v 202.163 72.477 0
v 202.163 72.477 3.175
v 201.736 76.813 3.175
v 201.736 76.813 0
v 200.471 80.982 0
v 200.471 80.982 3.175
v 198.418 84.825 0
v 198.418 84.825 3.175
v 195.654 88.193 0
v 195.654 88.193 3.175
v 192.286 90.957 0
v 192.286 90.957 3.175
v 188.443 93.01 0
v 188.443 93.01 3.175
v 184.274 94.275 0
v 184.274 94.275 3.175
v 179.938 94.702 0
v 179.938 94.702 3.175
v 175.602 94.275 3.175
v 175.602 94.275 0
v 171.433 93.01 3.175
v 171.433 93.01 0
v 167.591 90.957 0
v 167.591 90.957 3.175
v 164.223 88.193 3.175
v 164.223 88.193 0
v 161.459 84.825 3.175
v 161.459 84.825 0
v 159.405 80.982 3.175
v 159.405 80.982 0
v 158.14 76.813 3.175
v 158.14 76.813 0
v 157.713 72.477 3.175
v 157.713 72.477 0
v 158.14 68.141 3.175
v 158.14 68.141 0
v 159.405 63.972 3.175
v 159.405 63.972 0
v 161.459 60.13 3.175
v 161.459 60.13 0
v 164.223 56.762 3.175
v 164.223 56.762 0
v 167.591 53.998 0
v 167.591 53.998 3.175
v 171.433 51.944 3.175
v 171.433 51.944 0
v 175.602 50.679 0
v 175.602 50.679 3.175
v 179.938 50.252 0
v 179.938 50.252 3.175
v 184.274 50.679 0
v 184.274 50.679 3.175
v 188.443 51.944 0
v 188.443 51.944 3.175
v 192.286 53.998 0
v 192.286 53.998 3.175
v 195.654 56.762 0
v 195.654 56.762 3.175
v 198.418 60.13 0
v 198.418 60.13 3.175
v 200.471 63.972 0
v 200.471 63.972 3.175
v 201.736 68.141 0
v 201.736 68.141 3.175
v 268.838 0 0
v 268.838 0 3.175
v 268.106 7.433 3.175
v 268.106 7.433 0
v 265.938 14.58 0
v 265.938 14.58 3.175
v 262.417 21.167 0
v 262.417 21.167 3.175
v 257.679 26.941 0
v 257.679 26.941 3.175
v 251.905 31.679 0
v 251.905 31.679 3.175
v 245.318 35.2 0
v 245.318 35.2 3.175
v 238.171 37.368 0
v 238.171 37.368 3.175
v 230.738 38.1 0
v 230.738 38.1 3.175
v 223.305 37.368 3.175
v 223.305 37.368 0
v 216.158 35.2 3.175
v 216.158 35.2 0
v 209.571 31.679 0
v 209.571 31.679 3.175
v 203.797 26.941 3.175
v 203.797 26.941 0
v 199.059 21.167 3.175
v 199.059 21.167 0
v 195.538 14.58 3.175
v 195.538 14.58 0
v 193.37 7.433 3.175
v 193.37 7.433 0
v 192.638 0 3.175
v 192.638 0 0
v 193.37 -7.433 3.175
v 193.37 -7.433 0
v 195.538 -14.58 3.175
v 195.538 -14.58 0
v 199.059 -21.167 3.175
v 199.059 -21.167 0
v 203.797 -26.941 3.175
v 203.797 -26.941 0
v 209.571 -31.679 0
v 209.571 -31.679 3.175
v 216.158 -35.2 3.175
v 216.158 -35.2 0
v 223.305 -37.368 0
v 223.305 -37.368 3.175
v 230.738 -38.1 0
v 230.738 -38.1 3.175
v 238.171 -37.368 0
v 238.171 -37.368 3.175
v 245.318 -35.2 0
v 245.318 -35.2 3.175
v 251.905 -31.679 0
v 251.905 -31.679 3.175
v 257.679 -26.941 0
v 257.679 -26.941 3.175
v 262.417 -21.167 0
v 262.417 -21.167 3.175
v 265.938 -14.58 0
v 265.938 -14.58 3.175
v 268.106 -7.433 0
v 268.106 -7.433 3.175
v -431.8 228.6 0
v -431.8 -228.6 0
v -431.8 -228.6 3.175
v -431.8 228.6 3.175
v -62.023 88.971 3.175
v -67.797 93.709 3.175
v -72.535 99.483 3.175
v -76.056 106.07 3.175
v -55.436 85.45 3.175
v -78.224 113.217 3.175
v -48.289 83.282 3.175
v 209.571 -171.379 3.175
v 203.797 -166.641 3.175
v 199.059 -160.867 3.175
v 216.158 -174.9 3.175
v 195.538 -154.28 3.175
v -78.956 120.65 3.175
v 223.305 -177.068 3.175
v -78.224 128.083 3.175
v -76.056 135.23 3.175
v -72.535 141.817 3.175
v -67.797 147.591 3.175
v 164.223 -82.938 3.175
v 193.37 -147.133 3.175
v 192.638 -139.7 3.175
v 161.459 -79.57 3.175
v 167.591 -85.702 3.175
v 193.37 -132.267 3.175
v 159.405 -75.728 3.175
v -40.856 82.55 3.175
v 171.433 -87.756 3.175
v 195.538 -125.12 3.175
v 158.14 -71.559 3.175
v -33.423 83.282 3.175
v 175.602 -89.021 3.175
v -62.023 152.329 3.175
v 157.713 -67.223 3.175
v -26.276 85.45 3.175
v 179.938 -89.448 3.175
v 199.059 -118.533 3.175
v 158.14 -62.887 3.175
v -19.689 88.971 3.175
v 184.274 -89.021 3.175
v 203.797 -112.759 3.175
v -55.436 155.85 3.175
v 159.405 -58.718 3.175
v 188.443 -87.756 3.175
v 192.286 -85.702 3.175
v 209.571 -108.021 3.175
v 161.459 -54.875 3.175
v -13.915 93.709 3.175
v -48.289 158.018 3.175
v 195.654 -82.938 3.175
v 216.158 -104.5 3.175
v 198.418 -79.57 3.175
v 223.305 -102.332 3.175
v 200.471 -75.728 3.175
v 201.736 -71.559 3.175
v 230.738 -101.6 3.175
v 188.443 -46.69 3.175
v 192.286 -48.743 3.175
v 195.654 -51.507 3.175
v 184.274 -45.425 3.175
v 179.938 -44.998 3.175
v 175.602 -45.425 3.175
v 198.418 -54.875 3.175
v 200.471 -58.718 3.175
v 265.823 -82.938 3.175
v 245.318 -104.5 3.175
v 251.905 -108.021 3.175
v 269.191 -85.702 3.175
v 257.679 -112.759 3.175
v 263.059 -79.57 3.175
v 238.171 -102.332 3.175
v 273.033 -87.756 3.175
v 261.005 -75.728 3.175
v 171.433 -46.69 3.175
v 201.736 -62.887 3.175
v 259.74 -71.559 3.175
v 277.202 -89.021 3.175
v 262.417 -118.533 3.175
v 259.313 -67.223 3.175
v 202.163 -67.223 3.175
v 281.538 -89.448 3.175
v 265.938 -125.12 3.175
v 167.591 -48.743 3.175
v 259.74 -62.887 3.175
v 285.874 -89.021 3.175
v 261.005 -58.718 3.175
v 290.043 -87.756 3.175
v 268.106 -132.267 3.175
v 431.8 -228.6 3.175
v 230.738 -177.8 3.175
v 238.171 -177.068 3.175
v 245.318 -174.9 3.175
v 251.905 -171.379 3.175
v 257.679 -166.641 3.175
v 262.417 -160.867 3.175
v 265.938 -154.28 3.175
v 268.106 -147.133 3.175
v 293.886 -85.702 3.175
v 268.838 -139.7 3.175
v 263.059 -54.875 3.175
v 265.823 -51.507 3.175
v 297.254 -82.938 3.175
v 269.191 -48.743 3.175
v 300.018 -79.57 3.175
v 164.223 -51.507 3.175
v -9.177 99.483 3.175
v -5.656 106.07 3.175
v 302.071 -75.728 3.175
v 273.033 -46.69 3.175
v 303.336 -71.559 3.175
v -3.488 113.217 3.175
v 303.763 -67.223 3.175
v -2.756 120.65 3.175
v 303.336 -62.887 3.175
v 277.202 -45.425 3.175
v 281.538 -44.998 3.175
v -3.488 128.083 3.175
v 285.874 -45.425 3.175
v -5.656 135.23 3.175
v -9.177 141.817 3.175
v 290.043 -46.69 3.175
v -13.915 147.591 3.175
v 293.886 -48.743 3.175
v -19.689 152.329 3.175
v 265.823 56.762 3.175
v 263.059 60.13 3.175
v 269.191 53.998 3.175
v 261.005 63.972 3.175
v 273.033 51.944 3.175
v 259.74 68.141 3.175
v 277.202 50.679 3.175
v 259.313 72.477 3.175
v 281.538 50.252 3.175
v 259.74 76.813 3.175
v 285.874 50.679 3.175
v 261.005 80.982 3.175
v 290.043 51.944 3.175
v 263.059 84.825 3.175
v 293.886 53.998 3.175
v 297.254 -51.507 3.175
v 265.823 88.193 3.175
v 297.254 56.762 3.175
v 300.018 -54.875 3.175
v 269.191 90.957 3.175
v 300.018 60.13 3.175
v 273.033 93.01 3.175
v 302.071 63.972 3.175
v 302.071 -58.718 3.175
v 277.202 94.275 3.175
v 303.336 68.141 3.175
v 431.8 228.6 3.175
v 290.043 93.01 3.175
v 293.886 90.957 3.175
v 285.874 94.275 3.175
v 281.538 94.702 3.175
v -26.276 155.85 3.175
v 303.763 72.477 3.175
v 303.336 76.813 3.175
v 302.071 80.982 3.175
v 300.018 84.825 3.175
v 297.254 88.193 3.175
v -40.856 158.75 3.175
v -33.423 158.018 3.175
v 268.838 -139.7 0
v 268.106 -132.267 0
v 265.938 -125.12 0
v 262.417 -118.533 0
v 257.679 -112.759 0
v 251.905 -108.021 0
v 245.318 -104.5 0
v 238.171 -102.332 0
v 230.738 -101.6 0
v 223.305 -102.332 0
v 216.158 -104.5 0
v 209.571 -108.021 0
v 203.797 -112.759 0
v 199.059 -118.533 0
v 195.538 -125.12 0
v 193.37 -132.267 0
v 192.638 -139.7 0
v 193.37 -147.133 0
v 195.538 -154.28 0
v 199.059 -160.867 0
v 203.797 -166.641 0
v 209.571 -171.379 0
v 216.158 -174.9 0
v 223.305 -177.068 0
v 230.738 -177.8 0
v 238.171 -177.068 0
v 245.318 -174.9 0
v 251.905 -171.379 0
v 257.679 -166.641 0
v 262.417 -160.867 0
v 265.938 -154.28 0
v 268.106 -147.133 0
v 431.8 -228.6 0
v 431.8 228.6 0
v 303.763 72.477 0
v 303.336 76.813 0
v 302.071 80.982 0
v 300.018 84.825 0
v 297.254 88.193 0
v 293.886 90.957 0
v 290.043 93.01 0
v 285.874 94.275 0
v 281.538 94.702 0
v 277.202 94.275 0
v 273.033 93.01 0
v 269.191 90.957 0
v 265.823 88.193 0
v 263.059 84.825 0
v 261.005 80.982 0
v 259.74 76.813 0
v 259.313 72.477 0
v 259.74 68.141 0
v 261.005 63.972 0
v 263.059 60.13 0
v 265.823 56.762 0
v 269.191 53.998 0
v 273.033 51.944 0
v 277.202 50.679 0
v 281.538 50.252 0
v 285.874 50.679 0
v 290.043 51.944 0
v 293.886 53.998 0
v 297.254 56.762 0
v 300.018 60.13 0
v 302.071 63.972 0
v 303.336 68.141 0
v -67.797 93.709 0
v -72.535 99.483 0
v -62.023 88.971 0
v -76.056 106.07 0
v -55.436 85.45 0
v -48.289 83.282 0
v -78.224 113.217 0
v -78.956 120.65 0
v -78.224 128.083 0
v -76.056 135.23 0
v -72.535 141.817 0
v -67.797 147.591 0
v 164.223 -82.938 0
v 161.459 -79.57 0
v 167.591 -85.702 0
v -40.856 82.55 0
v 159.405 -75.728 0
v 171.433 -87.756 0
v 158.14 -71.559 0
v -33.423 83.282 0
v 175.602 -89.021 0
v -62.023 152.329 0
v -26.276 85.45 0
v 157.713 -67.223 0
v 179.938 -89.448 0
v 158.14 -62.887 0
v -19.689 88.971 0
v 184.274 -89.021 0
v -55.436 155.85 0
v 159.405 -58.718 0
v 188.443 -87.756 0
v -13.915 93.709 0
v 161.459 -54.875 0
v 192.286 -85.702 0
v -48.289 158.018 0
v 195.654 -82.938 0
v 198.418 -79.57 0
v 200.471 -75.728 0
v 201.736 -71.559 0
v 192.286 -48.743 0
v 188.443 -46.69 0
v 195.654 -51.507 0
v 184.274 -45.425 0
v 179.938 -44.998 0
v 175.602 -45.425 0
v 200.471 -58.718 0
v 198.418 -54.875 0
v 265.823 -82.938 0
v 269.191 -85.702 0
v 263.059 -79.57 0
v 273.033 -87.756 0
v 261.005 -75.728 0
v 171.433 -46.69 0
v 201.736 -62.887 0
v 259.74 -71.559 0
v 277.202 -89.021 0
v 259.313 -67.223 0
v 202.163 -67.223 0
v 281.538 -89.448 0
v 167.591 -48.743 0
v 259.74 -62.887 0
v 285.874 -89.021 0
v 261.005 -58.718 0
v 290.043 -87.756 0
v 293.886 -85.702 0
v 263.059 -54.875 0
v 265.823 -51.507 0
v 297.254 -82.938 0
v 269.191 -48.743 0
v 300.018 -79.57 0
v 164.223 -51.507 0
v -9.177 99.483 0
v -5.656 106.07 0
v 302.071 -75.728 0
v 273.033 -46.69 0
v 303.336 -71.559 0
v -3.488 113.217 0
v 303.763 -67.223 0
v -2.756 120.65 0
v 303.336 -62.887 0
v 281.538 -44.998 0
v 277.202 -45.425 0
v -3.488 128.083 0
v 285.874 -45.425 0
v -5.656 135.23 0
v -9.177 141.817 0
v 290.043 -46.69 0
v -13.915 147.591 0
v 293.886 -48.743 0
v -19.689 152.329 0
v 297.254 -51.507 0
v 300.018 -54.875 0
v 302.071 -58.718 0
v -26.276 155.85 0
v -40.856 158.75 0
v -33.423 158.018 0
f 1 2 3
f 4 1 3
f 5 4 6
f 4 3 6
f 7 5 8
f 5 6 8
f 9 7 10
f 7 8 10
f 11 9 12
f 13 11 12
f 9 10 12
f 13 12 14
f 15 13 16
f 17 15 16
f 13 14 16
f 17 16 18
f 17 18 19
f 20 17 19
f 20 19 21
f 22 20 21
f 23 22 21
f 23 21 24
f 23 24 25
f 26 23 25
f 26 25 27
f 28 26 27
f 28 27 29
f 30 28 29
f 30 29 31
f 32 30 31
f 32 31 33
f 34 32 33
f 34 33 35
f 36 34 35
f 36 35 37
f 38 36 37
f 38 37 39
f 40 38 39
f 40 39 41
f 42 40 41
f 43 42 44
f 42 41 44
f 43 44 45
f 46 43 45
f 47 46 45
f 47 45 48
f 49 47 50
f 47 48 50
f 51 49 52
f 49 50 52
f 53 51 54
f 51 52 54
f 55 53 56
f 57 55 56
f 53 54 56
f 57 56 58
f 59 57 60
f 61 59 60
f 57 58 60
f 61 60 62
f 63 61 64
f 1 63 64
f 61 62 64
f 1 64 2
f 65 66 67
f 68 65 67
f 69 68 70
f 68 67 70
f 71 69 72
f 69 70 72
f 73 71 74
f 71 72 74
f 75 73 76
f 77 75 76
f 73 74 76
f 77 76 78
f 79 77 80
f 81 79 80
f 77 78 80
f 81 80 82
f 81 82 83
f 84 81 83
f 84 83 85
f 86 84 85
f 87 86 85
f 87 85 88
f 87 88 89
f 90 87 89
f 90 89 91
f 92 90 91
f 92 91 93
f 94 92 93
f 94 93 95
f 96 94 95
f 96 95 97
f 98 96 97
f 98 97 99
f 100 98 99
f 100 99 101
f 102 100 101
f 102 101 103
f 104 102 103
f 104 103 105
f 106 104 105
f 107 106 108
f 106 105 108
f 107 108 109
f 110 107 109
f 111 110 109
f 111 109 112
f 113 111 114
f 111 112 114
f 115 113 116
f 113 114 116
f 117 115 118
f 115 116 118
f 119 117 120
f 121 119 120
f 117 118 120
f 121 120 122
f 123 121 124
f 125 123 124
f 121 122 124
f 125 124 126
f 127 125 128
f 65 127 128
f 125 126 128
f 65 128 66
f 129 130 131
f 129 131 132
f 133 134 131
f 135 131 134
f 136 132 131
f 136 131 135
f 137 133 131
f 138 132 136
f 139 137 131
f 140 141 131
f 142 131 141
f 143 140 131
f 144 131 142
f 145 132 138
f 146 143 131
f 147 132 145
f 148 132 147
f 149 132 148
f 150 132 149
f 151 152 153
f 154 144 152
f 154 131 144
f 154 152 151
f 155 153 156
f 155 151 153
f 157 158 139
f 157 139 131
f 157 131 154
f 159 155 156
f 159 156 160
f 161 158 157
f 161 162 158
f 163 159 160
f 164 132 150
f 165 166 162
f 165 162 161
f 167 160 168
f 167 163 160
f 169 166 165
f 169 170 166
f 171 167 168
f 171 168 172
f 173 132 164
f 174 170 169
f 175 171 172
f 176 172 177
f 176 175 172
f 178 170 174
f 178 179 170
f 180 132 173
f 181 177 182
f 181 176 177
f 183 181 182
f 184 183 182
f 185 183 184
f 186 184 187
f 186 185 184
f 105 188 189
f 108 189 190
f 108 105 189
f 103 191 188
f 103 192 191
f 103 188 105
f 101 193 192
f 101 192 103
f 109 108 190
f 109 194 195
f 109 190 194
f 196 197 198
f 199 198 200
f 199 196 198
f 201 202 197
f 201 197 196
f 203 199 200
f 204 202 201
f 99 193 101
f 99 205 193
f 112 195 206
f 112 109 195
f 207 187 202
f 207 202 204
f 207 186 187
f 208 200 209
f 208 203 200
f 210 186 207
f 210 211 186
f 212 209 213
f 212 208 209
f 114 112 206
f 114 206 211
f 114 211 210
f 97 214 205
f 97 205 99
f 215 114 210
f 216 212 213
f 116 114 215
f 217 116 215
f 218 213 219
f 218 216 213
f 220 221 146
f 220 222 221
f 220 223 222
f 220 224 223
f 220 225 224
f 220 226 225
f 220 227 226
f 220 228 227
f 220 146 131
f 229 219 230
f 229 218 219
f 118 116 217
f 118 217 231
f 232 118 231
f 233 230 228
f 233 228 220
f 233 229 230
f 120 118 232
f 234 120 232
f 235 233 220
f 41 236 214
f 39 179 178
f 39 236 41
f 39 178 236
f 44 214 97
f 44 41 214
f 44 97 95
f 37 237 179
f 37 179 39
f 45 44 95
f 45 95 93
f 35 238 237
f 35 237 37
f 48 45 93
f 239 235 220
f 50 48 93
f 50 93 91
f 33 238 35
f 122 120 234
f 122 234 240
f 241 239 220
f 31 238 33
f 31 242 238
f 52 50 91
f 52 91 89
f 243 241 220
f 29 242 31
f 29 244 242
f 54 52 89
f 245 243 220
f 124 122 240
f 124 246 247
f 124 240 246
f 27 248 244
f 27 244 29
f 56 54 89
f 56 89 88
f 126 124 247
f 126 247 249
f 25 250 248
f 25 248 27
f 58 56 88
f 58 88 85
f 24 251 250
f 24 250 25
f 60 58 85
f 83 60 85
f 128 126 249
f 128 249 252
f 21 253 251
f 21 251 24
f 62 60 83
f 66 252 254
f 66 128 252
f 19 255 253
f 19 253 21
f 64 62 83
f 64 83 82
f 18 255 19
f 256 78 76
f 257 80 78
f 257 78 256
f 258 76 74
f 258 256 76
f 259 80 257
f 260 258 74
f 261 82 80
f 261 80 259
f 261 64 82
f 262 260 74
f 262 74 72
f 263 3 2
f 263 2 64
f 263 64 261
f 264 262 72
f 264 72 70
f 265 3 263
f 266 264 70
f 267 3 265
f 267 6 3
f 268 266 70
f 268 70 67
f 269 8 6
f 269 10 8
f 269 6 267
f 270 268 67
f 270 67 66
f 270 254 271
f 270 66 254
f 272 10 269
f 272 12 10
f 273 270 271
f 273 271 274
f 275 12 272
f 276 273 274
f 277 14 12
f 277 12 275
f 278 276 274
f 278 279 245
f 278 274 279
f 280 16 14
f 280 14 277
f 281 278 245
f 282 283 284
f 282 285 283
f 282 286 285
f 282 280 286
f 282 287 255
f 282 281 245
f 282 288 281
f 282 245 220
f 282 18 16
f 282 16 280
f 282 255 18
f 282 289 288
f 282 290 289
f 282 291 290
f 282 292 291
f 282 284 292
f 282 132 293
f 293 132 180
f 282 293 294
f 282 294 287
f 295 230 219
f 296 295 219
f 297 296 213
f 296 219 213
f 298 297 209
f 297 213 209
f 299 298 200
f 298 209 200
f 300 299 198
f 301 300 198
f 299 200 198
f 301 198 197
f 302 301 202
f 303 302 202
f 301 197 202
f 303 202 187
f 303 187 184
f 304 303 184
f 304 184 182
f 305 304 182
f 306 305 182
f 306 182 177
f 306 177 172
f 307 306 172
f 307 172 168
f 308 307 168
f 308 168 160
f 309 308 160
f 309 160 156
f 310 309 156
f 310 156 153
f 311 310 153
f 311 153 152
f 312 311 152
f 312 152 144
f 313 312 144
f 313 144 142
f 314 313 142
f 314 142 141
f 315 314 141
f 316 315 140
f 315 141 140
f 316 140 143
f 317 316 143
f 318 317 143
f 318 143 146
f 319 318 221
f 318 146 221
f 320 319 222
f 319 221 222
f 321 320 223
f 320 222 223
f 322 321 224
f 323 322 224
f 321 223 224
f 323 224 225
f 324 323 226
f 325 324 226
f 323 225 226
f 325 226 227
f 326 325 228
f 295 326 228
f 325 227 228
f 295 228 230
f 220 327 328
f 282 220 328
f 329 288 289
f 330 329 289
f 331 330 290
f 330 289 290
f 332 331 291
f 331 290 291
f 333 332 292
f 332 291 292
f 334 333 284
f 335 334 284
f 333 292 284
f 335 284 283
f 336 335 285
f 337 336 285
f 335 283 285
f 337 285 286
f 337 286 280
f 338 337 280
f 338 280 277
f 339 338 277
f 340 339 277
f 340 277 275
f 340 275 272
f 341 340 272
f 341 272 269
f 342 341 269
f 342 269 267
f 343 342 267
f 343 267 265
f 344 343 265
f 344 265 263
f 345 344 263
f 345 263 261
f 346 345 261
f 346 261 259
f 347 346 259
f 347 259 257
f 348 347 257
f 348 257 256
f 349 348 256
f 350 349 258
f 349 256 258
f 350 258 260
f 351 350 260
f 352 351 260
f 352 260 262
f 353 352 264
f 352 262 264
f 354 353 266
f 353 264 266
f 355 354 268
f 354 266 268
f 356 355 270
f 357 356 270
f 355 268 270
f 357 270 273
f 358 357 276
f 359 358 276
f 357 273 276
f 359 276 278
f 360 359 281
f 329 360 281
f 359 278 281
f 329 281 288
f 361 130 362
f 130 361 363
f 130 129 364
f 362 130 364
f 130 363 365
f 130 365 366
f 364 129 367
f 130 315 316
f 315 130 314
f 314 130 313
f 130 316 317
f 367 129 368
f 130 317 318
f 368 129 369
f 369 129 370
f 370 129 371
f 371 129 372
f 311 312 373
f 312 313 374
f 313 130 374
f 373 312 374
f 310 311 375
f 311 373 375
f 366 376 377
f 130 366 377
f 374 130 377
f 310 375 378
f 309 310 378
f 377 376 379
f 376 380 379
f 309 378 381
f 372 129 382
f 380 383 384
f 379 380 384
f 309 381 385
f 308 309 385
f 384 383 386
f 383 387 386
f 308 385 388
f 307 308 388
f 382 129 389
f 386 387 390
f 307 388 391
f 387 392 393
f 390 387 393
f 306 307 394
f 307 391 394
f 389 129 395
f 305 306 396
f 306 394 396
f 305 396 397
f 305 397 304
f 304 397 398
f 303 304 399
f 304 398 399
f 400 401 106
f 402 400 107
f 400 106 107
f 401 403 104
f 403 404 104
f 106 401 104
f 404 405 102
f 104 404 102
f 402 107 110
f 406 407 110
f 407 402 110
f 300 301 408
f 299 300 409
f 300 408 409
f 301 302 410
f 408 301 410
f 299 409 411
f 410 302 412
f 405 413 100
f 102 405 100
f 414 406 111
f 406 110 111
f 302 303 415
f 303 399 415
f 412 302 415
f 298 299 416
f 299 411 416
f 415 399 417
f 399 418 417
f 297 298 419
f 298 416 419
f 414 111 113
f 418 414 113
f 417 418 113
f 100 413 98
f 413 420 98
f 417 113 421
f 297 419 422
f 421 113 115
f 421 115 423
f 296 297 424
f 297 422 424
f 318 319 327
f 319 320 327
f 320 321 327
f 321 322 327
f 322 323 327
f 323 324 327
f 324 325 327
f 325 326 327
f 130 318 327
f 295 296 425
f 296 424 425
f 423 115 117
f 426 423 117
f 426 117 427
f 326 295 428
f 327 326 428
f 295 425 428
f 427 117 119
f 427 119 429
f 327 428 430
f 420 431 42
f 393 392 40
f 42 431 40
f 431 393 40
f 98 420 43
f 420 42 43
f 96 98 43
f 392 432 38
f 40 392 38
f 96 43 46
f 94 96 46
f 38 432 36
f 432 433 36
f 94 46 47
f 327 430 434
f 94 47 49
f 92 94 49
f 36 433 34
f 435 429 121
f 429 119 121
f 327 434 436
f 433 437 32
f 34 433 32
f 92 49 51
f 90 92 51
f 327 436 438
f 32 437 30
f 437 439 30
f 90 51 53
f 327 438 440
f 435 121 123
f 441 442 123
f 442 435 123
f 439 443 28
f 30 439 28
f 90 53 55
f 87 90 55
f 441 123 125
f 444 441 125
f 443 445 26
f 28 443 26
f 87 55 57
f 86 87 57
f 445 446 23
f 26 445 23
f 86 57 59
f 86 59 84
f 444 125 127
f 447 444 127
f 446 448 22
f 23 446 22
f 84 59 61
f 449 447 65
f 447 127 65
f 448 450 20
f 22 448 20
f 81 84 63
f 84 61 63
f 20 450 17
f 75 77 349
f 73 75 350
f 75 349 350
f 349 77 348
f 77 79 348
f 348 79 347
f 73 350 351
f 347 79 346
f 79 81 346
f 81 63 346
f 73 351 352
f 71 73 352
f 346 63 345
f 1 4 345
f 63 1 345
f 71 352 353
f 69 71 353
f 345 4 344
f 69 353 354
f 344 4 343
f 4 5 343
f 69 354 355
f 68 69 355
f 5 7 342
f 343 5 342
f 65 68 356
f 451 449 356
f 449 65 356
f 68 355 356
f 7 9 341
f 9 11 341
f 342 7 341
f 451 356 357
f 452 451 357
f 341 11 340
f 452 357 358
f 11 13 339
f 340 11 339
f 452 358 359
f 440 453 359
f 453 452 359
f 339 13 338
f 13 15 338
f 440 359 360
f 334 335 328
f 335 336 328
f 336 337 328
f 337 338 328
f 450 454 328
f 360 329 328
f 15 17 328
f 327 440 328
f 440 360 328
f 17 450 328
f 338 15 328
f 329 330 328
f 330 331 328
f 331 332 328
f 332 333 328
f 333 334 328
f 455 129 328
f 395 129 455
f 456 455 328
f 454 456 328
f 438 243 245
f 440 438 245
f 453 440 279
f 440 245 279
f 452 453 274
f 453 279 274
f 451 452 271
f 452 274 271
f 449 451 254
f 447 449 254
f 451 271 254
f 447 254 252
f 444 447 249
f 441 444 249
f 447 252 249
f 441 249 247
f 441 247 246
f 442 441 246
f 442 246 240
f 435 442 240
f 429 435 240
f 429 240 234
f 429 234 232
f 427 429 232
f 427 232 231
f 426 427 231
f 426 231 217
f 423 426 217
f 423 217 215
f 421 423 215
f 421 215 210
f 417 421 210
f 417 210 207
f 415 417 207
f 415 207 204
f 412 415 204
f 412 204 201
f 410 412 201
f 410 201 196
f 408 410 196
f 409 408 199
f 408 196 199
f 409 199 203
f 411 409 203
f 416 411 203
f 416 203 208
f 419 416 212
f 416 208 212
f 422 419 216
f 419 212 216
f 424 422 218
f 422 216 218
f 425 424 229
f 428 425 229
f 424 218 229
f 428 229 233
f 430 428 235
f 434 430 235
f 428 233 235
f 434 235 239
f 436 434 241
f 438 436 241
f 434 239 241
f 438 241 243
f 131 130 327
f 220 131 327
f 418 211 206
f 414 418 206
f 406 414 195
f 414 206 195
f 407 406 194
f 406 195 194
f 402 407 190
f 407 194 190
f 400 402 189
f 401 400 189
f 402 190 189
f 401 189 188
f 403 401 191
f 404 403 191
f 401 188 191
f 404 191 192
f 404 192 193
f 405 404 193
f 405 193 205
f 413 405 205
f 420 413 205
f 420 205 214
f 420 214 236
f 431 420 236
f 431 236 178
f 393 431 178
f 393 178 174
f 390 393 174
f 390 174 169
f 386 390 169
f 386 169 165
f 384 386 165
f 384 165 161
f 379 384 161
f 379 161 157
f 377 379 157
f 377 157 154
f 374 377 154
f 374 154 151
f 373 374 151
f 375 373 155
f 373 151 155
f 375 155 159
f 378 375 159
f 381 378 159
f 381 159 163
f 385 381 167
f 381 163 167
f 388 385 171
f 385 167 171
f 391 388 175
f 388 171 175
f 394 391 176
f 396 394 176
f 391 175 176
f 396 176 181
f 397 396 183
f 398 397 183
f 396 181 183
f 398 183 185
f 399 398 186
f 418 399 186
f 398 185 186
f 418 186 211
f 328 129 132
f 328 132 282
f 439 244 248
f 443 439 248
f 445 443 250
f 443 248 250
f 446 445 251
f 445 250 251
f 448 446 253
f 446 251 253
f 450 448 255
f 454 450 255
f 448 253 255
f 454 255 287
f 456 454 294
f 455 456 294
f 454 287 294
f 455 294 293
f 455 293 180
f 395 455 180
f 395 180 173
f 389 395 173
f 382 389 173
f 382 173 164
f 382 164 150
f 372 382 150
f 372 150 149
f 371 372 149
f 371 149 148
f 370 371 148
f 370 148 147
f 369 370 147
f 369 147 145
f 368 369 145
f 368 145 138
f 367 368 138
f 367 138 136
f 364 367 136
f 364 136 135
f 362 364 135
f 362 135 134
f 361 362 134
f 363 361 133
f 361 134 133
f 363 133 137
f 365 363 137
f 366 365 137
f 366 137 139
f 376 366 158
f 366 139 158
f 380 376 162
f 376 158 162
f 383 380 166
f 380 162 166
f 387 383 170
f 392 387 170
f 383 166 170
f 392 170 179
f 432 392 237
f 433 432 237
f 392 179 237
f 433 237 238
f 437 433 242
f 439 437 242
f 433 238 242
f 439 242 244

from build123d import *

# Parameters (mm, degrees)
SKETCH1_W           = 863.6
SKETCH1_H           = 457.2
BOSS_EXTRUDE1_DEPTH = 3.175
SKETCH2_R           = 38.1
SKETCH2_R_2         = 22.225
CUT_EXTRUDE1_DEPTH  = 489.589071332


with BuildPart() as part:
    # Sketch1 → Boss-Extrude1 (new body)
    with BuildSketch(Plane.XY):
        Rectangle(SKETCH1_W, SKETCH1_H)
    extrude(amount=BOSS_EXTRUDE1_DEPTH)

    # Sketch2 → Cut-Extrude1 (cut, through all)
    with BuildSketch(Plane.XY.offset(3.175)):
        with Locations((230.738100004, 0)):
            Circle(SKETCH2_R)
        with Locations((230.738100004, -139.7)):
            Circle(SKETCH2_R)
        with Locations((179.938100004, -67.222799997)):
            Circle(SKETCH2_R_2)
        with Locations((281.538100004, -67.222799997)):
            Circle(SKETCH2_R_2)
        with Locations((179.938100004, 72.477200003)):
            Circle(SKETCH2_R_2)
        with Locations((281.538100004, 72.477200003)):
            Circle(SKETCH2_R_2)
        with Locations((-40.855899988, 120.65)):
            Circle(SKETCH2_R)
    extrude(amount=-CUT_EXTRUDE1_DEPTH, mode=Mode.SUBTRACT)


solid = part.part
